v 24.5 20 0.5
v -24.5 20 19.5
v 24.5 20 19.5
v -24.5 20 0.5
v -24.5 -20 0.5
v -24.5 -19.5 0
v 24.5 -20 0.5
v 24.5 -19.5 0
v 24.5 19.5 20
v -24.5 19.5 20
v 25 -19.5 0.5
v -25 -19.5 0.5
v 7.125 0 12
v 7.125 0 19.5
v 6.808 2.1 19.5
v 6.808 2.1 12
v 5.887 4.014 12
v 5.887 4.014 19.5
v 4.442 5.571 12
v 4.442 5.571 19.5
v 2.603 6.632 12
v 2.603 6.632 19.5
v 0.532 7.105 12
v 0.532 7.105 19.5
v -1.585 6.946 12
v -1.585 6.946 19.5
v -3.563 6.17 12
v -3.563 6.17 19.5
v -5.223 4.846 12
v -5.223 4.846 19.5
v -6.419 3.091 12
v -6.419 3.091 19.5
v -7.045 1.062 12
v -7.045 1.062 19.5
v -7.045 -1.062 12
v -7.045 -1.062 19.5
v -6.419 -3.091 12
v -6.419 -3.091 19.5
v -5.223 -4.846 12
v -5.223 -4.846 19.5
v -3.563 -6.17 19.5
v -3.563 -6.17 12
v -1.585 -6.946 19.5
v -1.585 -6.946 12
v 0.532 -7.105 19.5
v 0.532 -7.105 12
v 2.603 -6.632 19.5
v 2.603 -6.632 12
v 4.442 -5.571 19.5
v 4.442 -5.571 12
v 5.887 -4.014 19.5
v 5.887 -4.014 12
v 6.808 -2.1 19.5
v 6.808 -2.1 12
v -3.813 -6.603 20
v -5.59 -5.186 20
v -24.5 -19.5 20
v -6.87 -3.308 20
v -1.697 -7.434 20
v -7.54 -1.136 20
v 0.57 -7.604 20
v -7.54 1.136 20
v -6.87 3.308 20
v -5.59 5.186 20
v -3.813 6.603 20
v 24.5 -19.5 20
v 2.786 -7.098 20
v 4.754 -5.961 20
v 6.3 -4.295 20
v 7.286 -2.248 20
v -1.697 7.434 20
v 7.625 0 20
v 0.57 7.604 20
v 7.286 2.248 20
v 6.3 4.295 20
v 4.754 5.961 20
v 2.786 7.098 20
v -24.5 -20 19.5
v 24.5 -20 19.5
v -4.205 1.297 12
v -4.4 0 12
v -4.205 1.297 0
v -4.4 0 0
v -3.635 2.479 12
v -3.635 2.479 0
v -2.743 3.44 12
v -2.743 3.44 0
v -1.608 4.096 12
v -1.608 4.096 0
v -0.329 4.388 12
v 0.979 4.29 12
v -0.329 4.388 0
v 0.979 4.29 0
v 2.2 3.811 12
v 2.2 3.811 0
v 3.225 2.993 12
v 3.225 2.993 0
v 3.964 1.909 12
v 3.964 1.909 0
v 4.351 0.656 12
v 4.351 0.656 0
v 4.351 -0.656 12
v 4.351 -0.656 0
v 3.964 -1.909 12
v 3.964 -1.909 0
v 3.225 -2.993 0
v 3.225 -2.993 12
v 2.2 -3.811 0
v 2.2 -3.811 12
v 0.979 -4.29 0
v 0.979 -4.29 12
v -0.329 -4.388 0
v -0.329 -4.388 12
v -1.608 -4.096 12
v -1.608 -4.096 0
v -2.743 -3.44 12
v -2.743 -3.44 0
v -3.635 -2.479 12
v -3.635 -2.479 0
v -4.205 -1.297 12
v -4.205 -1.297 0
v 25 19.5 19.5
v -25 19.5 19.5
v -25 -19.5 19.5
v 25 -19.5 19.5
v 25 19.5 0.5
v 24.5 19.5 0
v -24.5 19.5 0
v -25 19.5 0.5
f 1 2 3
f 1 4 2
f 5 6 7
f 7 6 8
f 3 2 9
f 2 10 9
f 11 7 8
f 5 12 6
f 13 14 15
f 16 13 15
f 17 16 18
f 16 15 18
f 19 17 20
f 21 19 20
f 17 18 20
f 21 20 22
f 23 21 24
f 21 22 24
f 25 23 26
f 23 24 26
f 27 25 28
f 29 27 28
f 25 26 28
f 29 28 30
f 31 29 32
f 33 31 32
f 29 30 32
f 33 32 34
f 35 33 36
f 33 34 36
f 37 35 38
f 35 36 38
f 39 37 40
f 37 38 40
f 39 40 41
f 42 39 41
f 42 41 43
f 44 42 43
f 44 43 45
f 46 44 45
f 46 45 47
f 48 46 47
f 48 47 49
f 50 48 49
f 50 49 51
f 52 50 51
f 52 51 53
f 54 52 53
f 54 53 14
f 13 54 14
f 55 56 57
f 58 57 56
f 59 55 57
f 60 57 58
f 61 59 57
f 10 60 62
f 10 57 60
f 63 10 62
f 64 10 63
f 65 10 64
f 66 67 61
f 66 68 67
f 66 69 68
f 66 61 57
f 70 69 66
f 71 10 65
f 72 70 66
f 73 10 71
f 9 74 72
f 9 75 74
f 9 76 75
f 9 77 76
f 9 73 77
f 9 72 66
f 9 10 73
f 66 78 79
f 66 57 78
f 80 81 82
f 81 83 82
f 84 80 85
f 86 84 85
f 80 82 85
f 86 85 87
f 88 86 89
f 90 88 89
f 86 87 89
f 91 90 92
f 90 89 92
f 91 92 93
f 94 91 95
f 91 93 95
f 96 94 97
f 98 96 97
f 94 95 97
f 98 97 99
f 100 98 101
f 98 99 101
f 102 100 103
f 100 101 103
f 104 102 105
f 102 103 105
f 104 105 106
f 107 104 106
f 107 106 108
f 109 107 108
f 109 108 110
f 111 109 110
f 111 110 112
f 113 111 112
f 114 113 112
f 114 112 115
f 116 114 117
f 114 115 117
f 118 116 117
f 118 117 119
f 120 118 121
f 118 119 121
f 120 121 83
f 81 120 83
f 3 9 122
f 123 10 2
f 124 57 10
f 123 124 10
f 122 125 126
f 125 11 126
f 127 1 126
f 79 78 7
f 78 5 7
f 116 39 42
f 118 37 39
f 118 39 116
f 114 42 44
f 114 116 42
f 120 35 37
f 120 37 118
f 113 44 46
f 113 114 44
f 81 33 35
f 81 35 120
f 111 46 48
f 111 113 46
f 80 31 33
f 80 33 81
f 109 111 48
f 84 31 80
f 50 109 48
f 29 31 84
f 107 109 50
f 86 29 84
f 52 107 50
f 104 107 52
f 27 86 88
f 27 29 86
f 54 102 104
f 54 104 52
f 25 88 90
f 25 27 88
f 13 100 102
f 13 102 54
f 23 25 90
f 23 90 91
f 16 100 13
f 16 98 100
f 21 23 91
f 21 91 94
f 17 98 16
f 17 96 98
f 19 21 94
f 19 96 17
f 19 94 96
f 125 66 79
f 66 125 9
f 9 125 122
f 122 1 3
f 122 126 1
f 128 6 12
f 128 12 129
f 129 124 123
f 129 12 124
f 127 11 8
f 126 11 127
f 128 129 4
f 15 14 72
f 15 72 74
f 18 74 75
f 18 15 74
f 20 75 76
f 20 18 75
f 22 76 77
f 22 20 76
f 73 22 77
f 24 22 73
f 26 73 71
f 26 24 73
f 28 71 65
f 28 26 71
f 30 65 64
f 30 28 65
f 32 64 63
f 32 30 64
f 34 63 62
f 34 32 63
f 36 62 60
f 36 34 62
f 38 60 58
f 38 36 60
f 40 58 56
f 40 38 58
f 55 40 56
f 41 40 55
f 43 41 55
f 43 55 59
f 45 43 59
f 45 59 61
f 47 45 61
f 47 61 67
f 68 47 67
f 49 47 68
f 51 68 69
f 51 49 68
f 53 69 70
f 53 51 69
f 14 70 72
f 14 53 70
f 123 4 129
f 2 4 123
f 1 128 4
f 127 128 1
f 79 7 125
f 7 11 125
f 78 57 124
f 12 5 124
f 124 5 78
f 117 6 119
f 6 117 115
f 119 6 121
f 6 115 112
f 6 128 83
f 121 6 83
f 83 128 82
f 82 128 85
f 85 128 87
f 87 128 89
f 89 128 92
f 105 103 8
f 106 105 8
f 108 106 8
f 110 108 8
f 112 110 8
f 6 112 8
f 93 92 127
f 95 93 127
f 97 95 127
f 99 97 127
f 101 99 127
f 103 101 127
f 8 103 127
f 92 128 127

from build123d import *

# Parameters (mm, degrees)
F0_W           = 50
F0_H           = 40
F1_DEPTH       = 20
F3_D           = 8.8
F3_CBORE_D     = 14.25
F3_CBORE_DEPTH = 8
F4_SIZE        = 0.5


with BuildPart() as f1:
    # F0 (on Top) → F1 (new body)
    with BuildSketch(Plane.XY):
        Rectangle(F0_W, F0_H)
    extrude(amount=F1_DEPTH)

    # F3 (through all)
    with Locations(Plane.XY.offset(20)):
        with Locations((0, 0)):
            CounterBoreHole(F3_D / 2, F3_CBORE_D / 2, F3_CBORE_DEPTH)

    # F4
    f4_edges = [f1.edges().sort_by_distance(p)[0] for p in [
        (25, 0, 20),
        (0, -20, 20),
        (0, 20, 20),
        (-25, 0, 20),
        (-7.125, 0, 20),
        (-25, 20, 10),
        (-25, -20, 10),
        (-25, 0, 0),
        (25, 20, 10),
        (0, 20, 0),
        (25, -20, 10),
        (0, -20, 0),
        (25, 0, 0),
    ]]
    chamfer(f4_edges, length=F4_SIZE)


solid = f1.part
